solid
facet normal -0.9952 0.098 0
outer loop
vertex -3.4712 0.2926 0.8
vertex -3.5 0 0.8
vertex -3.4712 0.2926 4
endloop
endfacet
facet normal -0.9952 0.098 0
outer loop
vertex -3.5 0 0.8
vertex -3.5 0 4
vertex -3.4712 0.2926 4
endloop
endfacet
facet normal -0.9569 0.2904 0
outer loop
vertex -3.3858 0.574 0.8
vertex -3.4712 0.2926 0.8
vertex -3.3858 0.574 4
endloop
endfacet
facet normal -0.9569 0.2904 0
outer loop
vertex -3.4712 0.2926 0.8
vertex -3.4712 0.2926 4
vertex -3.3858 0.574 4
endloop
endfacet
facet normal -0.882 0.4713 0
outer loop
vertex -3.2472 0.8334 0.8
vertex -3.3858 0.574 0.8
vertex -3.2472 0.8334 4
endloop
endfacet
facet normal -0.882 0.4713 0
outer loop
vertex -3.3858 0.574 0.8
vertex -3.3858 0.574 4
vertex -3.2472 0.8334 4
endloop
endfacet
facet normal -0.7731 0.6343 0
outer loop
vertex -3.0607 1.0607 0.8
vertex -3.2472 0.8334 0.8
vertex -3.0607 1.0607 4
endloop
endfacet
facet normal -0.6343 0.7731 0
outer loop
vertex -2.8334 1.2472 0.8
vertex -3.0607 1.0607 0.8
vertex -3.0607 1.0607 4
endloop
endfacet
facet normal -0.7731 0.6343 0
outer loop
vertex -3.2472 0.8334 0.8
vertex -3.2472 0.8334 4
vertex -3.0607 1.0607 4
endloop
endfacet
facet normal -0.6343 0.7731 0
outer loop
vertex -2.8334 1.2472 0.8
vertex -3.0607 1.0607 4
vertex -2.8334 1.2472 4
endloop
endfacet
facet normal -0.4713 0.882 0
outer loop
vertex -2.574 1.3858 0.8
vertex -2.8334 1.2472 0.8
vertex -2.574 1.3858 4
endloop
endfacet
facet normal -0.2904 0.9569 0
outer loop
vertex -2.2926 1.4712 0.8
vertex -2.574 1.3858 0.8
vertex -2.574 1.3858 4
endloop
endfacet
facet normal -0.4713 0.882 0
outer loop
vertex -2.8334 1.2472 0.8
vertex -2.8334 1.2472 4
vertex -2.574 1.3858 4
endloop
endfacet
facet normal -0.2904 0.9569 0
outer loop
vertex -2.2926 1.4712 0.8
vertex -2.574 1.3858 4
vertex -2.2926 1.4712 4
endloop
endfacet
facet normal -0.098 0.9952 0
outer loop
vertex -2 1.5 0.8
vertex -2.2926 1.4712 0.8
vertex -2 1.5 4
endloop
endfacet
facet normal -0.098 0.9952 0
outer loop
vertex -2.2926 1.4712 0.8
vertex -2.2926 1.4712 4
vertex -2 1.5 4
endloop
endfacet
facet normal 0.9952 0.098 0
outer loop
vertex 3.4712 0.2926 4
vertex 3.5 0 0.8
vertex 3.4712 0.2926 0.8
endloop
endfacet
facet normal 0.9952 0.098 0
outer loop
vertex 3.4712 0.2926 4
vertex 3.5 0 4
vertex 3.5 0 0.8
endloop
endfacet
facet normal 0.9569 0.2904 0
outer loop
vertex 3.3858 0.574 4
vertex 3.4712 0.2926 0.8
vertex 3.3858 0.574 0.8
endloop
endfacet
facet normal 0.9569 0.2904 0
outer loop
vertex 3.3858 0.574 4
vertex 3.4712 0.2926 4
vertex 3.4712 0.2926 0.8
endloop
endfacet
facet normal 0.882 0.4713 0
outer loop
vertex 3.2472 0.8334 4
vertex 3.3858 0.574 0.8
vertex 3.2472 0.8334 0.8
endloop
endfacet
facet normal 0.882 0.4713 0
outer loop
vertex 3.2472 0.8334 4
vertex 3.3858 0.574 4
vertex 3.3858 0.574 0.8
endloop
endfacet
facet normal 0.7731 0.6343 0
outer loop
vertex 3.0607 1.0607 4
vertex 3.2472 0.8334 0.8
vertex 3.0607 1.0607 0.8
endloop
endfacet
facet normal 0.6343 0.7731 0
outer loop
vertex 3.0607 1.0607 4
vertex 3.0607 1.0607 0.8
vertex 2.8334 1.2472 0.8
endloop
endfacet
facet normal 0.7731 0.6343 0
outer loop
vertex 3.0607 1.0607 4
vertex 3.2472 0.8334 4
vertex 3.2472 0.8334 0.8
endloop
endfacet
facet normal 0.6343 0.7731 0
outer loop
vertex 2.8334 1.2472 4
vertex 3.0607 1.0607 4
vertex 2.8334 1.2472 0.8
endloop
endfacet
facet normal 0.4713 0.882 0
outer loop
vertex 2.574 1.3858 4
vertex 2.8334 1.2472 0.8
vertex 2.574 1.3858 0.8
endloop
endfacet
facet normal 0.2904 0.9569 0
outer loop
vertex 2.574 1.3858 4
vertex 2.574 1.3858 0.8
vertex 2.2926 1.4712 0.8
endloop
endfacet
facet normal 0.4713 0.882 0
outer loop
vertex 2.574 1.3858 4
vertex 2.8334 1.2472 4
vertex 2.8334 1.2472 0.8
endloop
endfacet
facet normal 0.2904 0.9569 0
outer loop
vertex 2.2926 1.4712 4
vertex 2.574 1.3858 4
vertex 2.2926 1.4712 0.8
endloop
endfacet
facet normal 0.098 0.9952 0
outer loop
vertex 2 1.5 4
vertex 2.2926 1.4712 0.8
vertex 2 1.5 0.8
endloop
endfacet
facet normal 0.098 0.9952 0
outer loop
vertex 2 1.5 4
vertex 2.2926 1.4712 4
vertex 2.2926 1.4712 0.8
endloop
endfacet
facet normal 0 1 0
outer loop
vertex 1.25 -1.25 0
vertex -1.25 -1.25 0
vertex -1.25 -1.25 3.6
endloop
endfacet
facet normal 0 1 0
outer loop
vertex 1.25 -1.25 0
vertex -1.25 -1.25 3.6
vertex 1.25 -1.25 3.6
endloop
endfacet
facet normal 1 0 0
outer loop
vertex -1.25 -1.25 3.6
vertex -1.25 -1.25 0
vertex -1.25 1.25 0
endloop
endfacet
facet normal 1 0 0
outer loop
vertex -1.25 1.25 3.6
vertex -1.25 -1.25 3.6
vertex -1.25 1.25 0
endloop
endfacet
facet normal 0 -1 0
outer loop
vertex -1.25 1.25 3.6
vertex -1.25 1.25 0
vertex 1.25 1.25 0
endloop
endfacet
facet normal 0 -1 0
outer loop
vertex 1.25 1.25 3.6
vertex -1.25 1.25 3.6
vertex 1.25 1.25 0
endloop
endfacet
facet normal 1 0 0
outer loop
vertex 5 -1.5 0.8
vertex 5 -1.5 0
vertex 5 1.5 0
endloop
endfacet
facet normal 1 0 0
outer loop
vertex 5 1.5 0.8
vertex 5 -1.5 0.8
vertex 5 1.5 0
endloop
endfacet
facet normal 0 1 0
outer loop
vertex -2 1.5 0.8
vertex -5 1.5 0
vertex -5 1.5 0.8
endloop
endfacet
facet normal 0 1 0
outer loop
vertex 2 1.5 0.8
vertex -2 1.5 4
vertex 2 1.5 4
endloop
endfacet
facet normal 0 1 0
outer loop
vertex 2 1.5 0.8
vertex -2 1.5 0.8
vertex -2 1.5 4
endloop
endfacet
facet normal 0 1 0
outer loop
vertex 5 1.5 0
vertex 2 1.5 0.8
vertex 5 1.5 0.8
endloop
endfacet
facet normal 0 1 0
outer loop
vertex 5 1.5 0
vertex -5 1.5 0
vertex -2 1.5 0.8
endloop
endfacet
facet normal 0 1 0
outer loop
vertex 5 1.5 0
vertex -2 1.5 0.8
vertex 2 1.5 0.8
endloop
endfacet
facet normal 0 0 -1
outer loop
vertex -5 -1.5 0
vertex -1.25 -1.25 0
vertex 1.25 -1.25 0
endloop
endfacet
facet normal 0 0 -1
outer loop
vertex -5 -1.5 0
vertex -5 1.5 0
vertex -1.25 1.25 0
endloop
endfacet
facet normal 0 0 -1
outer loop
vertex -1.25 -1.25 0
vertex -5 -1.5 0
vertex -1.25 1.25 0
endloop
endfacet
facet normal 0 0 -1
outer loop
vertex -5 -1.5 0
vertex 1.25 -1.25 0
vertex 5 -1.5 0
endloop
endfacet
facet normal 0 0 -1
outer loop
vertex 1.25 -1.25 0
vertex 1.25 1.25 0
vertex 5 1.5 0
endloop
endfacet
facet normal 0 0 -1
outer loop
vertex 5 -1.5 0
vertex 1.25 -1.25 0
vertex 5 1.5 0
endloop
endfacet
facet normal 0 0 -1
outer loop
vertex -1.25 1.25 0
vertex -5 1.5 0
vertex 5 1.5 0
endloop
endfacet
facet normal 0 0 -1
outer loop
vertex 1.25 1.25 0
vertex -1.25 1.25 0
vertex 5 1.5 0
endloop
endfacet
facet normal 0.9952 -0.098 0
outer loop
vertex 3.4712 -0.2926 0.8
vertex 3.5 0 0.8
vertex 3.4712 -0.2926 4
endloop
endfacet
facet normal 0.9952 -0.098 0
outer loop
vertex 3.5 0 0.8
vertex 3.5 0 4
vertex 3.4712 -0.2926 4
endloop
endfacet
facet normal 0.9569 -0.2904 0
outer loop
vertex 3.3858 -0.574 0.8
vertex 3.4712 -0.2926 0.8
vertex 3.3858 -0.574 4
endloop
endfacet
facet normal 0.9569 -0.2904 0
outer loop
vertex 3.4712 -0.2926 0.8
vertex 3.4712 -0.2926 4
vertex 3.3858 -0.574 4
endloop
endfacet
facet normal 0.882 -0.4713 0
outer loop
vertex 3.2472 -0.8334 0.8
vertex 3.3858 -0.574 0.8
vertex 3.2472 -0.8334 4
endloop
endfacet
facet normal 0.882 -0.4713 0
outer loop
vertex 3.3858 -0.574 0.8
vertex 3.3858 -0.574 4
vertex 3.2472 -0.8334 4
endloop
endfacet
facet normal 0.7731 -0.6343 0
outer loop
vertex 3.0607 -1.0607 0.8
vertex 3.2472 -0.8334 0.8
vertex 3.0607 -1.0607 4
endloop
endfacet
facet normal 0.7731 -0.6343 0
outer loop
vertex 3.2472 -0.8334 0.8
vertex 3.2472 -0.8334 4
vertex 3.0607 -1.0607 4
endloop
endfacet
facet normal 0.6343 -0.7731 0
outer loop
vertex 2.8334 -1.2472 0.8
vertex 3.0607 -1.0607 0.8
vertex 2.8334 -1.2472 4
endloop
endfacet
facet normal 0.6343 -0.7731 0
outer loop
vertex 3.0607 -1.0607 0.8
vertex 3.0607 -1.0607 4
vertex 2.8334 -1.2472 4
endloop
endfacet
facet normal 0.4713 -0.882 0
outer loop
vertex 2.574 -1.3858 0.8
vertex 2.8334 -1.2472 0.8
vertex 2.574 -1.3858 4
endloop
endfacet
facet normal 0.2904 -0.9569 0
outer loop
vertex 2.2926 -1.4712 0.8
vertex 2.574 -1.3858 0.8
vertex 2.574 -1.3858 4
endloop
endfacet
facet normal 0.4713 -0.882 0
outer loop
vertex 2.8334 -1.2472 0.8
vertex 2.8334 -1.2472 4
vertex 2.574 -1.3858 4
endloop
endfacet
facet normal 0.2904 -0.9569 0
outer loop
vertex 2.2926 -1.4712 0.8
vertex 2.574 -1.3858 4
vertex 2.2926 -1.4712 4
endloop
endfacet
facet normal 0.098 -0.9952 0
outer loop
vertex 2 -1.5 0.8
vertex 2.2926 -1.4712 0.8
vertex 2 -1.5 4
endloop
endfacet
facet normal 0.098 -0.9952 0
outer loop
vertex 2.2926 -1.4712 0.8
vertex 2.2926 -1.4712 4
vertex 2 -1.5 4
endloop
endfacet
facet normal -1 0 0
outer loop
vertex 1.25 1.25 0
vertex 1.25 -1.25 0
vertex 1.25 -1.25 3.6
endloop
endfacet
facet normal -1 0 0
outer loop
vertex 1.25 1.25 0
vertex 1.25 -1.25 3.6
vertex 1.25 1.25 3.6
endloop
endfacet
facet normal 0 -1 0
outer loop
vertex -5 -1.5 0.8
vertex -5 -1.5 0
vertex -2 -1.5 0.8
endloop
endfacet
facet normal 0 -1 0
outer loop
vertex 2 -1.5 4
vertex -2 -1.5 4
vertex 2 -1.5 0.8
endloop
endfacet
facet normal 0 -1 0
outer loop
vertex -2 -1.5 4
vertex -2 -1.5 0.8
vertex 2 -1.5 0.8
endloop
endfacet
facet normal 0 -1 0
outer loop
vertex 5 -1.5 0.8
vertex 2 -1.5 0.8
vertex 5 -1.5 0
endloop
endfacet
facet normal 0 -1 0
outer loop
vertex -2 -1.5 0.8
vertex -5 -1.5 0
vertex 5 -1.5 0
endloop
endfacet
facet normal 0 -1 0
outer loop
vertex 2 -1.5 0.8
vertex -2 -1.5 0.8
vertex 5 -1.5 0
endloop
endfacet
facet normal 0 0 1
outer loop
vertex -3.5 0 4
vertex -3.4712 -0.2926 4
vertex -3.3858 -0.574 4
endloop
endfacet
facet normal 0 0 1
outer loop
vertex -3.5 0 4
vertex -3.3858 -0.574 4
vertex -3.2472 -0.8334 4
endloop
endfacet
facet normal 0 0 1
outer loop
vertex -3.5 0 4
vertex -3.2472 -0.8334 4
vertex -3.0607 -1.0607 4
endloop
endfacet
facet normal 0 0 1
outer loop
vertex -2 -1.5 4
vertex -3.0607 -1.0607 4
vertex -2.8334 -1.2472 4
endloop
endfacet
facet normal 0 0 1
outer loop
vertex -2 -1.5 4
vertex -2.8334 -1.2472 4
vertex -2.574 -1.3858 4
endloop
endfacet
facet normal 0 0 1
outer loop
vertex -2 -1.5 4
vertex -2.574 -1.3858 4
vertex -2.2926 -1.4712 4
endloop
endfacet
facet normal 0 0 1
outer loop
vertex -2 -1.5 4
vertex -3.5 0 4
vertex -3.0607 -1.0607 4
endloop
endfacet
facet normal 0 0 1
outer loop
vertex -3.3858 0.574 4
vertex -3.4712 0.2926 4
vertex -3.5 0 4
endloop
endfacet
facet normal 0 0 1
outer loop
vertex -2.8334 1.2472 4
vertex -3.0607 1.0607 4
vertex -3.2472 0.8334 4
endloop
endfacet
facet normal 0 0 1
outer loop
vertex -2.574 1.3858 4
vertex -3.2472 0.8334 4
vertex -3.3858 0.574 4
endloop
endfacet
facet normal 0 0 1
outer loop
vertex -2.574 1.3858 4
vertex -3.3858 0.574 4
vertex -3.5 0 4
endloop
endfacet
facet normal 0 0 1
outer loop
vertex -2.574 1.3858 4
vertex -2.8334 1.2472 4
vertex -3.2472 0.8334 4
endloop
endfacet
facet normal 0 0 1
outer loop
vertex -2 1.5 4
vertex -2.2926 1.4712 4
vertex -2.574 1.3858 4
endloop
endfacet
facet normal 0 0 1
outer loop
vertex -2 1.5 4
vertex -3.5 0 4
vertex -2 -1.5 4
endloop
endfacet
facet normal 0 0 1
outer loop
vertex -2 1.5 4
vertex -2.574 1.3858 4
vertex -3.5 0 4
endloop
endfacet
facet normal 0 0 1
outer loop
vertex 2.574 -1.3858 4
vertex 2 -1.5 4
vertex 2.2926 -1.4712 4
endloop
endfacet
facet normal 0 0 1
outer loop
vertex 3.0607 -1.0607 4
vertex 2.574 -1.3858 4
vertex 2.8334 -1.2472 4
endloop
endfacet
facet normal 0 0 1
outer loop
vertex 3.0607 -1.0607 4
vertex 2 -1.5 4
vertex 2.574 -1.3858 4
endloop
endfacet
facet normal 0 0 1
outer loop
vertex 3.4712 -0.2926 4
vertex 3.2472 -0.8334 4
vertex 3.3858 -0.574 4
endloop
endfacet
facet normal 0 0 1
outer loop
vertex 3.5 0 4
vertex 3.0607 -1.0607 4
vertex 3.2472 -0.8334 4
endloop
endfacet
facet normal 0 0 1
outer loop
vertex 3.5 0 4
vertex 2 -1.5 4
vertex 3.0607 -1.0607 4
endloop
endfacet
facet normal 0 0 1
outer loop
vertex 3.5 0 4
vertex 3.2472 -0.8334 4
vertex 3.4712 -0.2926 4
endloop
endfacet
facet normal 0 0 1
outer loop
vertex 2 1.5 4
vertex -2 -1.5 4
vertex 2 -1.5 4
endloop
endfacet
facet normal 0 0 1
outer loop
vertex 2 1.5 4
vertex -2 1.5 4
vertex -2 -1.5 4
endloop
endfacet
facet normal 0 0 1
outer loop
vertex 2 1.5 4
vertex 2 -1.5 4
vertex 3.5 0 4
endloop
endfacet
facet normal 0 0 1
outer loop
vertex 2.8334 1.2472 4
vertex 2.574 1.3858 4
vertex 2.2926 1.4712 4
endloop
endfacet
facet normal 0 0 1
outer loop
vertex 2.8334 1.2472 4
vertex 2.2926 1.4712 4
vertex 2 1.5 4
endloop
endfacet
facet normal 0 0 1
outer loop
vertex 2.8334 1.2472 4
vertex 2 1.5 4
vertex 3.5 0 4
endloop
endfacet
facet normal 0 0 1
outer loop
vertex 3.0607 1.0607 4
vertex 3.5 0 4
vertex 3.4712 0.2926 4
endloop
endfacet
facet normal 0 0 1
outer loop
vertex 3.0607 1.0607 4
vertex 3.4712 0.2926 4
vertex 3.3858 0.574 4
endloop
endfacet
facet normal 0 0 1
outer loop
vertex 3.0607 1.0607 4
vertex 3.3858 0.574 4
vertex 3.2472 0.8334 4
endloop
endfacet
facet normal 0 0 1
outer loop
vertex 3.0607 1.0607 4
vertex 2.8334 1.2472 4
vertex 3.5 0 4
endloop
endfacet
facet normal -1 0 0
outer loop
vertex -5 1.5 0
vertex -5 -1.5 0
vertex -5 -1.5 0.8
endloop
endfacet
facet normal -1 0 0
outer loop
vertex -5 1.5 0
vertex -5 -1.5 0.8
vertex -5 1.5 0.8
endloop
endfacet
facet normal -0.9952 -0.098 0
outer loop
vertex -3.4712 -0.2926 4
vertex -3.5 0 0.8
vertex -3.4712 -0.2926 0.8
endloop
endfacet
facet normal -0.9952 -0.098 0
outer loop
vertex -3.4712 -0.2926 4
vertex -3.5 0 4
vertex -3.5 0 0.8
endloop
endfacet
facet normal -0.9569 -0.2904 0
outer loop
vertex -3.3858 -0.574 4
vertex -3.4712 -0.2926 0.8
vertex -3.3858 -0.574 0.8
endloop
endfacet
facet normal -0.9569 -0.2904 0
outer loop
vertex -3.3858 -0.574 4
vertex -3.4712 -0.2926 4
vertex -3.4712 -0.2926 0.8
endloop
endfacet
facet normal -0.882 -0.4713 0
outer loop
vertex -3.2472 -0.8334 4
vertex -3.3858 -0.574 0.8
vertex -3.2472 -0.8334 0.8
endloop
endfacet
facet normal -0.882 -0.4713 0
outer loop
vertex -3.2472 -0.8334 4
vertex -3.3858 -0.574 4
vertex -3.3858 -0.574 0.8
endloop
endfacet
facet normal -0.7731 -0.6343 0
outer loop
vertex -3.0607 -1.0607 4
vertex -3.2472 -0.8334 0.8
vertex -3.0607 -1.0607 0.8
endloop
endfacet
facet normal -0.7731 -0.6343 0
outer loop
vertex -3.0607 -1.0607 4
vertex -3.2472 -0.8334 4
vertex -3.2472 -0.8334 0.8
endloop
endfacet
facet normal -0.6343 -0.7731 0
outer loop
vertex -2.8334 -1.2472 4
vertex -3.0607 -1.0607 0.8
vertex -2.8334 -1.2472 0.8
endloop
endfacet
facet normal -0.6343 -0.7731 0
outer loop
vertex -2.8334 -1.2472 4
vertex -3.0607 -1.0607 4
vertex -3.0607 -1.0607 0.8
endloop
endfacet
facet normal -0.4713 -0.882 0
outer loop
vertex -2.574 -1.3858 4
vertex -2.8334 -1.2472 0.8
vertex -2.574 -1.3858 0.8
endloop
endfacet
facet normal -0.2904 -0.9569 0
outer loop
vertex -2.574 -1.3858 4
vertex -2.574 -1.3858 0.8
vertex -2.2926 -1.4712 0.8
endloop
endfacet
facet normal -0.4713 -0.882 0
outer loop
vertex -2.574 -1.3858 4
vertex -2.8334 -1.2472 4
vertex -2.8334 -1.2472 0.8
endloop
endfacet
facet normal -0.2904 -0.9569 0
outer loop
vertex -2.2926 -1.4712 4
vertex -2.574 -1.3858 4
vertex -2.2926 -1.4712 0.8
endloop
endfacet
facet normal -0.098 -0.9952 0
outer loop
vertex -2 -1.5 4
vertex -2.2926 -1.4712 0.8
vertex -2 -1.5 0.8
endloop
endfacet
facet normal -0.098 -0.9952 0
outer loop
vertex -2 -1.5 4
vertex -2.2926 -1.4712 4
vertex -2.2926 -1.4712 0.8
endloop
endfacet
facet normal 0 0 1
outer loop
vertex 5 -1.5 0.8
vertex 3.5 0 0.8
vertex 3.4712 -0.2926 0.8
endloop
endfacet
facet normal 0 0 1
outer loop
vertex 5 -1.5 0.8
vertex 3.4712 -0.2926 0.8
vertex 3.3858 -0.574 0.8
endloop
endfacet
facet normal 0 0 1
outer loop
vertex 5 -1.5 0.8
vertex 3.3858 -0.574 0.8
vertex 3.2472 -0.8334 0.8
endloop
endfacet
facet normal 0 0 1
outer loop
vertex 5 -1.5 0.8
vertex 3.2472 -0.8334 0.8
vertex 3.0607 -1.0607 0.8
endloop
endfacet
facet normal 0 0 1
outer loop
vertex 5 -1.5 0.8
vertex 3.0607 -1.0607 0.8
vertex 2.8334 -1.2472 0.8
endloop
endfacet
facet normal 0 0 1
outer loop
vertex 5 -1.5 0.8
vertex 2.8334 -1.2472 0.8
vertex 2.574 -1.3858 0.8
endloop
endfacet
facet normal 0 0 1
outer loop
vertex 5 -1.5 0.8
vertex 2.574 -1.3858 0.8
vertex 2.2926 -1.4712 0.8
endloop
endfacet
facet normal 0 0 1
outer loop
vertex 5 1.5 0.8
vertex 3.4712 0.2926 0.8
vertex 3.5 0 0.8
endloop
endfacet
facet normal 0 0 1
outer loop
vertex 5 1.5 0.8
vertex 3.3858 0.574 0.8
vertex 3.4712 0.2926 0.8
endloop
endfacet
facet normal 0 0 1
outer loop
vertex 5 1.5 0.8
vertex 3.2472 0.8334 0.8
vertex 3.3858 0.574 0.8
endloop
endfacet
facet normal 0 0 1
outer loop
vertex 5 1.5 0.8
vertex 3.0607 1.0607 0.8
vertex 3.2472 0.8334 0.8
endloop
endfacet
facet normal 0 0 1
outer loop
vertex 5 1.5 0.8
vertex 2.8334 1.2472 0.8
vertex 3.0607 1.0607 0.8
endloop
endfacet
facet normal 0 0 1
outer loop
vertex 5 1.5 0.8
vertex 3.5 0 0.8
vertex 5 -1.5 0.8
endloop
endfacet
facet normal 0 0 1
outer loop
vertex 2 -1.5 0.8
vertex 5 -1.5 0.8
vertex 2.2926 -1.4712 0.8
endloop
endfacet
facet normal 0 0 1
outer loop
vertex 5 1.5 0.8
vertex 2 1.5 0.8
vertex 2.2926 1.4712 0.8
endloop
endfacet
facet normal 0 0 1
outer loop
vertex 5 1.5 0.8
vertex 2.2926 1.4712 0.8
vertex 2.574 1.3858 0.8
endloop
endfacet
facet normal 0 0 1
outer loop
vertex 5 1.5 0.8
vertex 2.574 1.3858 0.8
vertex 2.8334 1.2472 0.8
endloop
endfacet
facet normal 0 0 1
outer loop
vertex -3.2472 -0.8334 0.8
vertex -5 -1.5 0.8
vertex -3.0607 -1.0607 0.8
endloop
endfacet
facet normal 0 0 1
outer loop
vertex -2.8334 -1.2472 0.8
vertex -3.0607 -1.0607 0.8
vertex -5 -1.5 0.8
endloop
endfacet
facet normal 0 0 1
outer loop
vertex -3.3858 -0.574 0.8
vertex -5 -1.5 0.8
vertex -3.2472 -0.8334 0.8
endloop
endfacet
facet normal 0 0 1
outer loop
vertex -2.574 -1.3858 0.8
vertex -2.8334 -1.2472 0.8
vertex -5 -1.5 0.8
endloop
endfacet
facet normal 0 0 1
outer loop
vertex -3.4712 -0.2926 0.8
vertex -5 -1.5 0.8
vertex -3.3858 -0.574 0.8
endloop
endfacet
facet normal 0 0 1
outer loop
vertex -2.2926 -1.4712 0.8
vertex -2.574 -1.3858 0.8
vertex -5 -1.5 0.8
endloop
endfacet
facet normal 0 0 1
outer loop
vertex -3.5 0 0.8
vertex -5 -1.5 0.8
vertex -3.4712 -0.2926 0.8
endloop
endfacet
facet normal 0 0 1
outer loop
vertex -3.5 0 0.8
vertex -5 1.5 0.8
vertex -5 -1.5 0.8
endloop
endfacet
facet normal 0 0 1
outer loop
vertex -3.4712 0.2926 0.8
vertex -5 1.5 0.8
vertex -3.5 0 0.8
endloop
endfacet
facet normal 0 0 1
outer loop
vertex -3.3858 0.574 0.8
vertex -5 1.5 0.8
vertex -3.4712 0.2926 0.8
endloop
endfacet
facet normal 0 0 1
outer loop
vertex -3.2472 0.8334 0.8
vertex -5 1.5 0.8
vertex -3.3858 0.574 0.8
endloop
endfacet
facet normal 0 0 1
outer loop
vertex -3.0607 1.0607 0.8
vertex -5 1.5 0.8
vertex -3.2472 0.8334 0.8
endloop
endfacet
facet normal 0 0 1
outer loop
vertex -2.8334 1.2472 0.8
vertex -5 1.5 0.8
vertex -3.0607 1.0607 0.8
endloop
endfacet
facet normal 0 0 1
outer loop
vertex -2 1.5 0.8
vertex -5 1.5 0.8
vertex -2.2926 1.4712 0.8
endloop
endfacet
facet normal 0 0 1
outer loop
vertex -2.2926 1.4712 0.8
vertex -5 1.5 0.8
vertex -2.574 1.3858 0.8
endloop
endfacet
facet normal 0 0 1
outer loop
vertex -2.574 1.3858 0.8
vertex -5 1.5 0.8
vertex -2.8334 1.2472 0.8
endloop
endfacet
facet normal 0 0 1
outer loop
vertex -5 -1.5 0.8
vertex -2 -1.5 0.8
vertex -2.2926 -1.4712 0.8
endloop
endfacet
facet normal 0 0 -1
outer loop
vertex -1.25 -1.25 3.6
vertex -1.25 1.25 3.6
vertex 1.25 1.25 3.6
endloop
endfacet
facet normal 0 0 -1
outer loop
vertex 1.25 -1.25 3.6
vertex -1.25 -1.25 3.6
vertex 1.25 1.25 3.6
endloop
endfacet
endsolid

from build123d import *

# Parameters (mm, degrees)
F0_W     = 7
F0_H     = 3
F0_W_2   = 2.5
F0_H_2   = 2.5
F1_DEPTH = 4
F0_W_3   = 1.5
F2_DEPTH = 0.8
F3_R     = 1.49999
F4_DEPTH = 3.6


# Not quite as in the source:
# - a fillet or chamfer is up to 0.001 mm smaller than in the source, because OpenCascade refuses the exact size


with BuildPart() as f1:
    # F0 (on Top) → F1 (new body)
    with BuildSketch(Plane.XY):
        Rectangle(F0_W, F0_H)
        Rectangle(F0_W_2, F0_H_2, mode=Mode.SUBTRACT)
        Rectangle(F0_W_2, F0_H_2)
    extrude(amount=F1_DEPTH)

    # F0 (on Top) → F2 (join)
    with BuildSketch(Plane.XY):
        with Locations((-4.25, 0)):
            Rectangle(F0_W_3, F0_H)
        with Locations((4.25, 0)):
            Rectangle(F0_W_3, F0_H)
    extrude(amount=F2_DEPTH)

    # F3 (radius 1.5 in the source; OpenCascade refuses exactly that, so slightly less here)
    f3_edges = [f1.edges().sort_by_distance(p)[0] for p in [
        (-3.5, 1.5, 2.4),
        (-3.5, -1.5, 2.4),
        (3.5, -1.5, 2.4),
        (3.5, 1.5, 2.4),
    ]]
    fillet(f3_edges, radius=F3_R)

    # F0 (on Top) → F4 (cut)
    with BuildSketch(Plane.XY):
        Rectangle(F0_W_2, F0_H_2)
    extrude(amount=F4_DEPTH, mode=Mode.SUBTRACT)


solid = f1.part
